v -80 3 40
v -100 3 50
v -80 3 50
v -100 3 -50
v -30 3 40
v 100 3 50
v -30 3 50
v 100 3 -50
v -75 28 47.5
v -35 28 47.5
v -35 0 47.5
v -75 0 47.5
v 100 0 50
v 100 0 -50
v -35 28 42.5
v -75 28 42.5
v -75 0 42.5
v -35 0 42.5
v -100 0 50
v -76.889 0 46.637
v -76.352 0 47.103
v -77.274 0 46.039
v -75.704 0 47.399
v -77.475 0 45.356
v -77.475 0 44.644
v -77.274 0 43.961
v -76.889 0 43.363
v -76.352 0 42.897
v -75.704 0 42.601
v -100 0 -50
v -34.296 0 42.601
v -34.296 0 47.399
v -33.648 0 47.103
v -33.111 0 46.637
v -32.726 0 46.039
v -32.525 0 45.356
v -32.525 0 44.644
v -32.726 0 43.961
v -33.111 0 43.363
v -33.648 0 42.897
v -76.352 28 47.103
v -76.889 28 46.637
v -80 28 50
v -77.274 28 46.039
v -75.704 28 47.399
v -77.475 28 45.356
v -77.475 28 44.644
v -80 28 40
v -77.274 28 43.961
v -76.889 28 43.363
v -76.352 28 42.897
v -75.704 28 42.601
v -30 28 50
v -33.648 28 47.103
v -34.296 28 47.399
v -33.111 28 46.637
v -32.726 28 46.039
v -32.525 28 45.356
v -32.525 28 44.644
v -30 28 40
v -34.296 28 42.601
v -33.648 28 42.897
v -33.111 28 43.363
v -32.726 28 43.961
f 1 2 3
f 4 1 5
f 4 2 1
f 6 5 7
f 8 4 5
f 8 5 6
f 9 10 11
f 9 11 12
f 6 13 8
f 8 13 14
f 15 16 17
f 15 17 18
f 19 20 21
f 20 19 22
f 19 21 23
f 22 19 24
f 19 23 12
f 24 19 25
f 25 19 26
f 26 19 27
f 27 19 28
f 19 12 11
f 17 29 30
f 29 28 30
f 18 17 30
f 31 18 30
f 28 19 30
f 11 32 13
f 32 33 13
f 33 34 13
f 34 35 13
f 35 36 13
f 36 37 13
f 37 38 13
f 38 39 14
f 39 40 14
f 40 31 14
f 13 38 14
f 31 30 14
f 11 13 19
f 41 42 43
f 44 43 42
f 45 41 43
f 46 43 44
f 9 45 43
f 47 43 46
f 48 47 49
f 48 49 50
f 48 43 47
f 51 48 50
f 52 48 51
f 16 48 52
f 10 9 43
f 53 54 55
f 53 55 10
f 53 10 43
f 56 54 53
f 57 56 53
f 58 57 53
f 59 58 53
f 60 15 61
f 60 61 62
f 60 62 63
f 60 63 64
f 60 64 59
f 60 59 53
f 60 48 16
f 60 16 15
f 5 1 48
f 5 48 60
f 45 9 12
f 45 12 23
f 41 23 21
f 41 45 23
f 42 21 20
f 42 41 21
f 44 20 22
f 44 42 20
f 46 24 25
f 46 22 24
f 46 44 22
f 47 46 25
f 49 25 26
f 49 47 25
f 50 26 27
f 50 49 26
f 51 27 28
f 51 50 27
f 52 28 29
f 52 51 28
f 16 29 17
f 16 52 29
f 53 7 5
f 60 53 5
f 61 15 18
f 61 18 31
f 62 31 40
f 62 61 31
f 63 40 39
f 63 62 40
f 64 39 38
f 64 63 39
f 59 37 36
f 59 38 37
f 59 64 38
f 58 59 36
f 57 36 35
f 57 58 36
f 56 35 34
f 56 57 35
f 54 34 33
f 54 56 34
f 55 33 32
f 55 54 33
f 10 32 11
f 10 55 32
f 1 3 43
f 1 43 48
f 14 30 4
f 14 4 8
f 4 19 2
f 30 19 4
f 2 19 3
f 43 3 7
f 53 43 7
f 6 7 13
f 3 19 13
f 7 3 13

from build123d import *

# Parameters (mm, degrees)
SKETCH1_W           = 200
SKETCH1_H           = 100
BOSS_EXTRUDE1_DEPTH = 3
SKETCH2_W           = 50
SKETCH2_H           = 10
BOSS_EXTRUDE2_DEPTH = 25
CUT_EXTRUDE1_DEPTH  = 29


with BuildPart() as part:
    # Sketch1 → Boss-Extrude1 (new body)
    with BuildSketch(Plane(origin=(0, 0, 0), x_dir=(1, 0, 0), z_dir=(0, 1, 0))):
        Rectangle(SKETCH1_W, SKETCH1_H)
    extrude(amount=BOSS_EXTRUDE1_DEPTH)

    # Sketch2 → Boss-Extrude2 (add)
    with BuildSketch(Plane(origin=(0, 3, 0), x_dir=(1, 0, 0), z_dir=(0, 1, 0))):
        with Locations((-55, -45)):
            Rectangle(SKETCH2_W, SKETCH2_H)
    extrude(amount=BOSS_EXTRUDE2_DEPTH)

    # Sketch3 → Cut-Extrude1 (cut, through all)
    with BuildSketch(Plane(origin=(0, 28, 0), x_dir=(1, 0, 0), z_dir=(0, 1, 0))):
        with BuildLine():
            Line((-75, -42.5), (-35, -42.5))
            ThreePointArc((-35, -42.5), (-32.5, -45), (-35, -47.5))
            Line((-35, -47.5), (-75, -47.5))
            ThreePointArc((-75, -47.5), (-77.5, -45), (-75, -42.5))
        make_face()
    extrude(amount=-CUT_EXTRUDE1_DEPTH, mode=Mode.SUBTRACT)


solid = part.part
